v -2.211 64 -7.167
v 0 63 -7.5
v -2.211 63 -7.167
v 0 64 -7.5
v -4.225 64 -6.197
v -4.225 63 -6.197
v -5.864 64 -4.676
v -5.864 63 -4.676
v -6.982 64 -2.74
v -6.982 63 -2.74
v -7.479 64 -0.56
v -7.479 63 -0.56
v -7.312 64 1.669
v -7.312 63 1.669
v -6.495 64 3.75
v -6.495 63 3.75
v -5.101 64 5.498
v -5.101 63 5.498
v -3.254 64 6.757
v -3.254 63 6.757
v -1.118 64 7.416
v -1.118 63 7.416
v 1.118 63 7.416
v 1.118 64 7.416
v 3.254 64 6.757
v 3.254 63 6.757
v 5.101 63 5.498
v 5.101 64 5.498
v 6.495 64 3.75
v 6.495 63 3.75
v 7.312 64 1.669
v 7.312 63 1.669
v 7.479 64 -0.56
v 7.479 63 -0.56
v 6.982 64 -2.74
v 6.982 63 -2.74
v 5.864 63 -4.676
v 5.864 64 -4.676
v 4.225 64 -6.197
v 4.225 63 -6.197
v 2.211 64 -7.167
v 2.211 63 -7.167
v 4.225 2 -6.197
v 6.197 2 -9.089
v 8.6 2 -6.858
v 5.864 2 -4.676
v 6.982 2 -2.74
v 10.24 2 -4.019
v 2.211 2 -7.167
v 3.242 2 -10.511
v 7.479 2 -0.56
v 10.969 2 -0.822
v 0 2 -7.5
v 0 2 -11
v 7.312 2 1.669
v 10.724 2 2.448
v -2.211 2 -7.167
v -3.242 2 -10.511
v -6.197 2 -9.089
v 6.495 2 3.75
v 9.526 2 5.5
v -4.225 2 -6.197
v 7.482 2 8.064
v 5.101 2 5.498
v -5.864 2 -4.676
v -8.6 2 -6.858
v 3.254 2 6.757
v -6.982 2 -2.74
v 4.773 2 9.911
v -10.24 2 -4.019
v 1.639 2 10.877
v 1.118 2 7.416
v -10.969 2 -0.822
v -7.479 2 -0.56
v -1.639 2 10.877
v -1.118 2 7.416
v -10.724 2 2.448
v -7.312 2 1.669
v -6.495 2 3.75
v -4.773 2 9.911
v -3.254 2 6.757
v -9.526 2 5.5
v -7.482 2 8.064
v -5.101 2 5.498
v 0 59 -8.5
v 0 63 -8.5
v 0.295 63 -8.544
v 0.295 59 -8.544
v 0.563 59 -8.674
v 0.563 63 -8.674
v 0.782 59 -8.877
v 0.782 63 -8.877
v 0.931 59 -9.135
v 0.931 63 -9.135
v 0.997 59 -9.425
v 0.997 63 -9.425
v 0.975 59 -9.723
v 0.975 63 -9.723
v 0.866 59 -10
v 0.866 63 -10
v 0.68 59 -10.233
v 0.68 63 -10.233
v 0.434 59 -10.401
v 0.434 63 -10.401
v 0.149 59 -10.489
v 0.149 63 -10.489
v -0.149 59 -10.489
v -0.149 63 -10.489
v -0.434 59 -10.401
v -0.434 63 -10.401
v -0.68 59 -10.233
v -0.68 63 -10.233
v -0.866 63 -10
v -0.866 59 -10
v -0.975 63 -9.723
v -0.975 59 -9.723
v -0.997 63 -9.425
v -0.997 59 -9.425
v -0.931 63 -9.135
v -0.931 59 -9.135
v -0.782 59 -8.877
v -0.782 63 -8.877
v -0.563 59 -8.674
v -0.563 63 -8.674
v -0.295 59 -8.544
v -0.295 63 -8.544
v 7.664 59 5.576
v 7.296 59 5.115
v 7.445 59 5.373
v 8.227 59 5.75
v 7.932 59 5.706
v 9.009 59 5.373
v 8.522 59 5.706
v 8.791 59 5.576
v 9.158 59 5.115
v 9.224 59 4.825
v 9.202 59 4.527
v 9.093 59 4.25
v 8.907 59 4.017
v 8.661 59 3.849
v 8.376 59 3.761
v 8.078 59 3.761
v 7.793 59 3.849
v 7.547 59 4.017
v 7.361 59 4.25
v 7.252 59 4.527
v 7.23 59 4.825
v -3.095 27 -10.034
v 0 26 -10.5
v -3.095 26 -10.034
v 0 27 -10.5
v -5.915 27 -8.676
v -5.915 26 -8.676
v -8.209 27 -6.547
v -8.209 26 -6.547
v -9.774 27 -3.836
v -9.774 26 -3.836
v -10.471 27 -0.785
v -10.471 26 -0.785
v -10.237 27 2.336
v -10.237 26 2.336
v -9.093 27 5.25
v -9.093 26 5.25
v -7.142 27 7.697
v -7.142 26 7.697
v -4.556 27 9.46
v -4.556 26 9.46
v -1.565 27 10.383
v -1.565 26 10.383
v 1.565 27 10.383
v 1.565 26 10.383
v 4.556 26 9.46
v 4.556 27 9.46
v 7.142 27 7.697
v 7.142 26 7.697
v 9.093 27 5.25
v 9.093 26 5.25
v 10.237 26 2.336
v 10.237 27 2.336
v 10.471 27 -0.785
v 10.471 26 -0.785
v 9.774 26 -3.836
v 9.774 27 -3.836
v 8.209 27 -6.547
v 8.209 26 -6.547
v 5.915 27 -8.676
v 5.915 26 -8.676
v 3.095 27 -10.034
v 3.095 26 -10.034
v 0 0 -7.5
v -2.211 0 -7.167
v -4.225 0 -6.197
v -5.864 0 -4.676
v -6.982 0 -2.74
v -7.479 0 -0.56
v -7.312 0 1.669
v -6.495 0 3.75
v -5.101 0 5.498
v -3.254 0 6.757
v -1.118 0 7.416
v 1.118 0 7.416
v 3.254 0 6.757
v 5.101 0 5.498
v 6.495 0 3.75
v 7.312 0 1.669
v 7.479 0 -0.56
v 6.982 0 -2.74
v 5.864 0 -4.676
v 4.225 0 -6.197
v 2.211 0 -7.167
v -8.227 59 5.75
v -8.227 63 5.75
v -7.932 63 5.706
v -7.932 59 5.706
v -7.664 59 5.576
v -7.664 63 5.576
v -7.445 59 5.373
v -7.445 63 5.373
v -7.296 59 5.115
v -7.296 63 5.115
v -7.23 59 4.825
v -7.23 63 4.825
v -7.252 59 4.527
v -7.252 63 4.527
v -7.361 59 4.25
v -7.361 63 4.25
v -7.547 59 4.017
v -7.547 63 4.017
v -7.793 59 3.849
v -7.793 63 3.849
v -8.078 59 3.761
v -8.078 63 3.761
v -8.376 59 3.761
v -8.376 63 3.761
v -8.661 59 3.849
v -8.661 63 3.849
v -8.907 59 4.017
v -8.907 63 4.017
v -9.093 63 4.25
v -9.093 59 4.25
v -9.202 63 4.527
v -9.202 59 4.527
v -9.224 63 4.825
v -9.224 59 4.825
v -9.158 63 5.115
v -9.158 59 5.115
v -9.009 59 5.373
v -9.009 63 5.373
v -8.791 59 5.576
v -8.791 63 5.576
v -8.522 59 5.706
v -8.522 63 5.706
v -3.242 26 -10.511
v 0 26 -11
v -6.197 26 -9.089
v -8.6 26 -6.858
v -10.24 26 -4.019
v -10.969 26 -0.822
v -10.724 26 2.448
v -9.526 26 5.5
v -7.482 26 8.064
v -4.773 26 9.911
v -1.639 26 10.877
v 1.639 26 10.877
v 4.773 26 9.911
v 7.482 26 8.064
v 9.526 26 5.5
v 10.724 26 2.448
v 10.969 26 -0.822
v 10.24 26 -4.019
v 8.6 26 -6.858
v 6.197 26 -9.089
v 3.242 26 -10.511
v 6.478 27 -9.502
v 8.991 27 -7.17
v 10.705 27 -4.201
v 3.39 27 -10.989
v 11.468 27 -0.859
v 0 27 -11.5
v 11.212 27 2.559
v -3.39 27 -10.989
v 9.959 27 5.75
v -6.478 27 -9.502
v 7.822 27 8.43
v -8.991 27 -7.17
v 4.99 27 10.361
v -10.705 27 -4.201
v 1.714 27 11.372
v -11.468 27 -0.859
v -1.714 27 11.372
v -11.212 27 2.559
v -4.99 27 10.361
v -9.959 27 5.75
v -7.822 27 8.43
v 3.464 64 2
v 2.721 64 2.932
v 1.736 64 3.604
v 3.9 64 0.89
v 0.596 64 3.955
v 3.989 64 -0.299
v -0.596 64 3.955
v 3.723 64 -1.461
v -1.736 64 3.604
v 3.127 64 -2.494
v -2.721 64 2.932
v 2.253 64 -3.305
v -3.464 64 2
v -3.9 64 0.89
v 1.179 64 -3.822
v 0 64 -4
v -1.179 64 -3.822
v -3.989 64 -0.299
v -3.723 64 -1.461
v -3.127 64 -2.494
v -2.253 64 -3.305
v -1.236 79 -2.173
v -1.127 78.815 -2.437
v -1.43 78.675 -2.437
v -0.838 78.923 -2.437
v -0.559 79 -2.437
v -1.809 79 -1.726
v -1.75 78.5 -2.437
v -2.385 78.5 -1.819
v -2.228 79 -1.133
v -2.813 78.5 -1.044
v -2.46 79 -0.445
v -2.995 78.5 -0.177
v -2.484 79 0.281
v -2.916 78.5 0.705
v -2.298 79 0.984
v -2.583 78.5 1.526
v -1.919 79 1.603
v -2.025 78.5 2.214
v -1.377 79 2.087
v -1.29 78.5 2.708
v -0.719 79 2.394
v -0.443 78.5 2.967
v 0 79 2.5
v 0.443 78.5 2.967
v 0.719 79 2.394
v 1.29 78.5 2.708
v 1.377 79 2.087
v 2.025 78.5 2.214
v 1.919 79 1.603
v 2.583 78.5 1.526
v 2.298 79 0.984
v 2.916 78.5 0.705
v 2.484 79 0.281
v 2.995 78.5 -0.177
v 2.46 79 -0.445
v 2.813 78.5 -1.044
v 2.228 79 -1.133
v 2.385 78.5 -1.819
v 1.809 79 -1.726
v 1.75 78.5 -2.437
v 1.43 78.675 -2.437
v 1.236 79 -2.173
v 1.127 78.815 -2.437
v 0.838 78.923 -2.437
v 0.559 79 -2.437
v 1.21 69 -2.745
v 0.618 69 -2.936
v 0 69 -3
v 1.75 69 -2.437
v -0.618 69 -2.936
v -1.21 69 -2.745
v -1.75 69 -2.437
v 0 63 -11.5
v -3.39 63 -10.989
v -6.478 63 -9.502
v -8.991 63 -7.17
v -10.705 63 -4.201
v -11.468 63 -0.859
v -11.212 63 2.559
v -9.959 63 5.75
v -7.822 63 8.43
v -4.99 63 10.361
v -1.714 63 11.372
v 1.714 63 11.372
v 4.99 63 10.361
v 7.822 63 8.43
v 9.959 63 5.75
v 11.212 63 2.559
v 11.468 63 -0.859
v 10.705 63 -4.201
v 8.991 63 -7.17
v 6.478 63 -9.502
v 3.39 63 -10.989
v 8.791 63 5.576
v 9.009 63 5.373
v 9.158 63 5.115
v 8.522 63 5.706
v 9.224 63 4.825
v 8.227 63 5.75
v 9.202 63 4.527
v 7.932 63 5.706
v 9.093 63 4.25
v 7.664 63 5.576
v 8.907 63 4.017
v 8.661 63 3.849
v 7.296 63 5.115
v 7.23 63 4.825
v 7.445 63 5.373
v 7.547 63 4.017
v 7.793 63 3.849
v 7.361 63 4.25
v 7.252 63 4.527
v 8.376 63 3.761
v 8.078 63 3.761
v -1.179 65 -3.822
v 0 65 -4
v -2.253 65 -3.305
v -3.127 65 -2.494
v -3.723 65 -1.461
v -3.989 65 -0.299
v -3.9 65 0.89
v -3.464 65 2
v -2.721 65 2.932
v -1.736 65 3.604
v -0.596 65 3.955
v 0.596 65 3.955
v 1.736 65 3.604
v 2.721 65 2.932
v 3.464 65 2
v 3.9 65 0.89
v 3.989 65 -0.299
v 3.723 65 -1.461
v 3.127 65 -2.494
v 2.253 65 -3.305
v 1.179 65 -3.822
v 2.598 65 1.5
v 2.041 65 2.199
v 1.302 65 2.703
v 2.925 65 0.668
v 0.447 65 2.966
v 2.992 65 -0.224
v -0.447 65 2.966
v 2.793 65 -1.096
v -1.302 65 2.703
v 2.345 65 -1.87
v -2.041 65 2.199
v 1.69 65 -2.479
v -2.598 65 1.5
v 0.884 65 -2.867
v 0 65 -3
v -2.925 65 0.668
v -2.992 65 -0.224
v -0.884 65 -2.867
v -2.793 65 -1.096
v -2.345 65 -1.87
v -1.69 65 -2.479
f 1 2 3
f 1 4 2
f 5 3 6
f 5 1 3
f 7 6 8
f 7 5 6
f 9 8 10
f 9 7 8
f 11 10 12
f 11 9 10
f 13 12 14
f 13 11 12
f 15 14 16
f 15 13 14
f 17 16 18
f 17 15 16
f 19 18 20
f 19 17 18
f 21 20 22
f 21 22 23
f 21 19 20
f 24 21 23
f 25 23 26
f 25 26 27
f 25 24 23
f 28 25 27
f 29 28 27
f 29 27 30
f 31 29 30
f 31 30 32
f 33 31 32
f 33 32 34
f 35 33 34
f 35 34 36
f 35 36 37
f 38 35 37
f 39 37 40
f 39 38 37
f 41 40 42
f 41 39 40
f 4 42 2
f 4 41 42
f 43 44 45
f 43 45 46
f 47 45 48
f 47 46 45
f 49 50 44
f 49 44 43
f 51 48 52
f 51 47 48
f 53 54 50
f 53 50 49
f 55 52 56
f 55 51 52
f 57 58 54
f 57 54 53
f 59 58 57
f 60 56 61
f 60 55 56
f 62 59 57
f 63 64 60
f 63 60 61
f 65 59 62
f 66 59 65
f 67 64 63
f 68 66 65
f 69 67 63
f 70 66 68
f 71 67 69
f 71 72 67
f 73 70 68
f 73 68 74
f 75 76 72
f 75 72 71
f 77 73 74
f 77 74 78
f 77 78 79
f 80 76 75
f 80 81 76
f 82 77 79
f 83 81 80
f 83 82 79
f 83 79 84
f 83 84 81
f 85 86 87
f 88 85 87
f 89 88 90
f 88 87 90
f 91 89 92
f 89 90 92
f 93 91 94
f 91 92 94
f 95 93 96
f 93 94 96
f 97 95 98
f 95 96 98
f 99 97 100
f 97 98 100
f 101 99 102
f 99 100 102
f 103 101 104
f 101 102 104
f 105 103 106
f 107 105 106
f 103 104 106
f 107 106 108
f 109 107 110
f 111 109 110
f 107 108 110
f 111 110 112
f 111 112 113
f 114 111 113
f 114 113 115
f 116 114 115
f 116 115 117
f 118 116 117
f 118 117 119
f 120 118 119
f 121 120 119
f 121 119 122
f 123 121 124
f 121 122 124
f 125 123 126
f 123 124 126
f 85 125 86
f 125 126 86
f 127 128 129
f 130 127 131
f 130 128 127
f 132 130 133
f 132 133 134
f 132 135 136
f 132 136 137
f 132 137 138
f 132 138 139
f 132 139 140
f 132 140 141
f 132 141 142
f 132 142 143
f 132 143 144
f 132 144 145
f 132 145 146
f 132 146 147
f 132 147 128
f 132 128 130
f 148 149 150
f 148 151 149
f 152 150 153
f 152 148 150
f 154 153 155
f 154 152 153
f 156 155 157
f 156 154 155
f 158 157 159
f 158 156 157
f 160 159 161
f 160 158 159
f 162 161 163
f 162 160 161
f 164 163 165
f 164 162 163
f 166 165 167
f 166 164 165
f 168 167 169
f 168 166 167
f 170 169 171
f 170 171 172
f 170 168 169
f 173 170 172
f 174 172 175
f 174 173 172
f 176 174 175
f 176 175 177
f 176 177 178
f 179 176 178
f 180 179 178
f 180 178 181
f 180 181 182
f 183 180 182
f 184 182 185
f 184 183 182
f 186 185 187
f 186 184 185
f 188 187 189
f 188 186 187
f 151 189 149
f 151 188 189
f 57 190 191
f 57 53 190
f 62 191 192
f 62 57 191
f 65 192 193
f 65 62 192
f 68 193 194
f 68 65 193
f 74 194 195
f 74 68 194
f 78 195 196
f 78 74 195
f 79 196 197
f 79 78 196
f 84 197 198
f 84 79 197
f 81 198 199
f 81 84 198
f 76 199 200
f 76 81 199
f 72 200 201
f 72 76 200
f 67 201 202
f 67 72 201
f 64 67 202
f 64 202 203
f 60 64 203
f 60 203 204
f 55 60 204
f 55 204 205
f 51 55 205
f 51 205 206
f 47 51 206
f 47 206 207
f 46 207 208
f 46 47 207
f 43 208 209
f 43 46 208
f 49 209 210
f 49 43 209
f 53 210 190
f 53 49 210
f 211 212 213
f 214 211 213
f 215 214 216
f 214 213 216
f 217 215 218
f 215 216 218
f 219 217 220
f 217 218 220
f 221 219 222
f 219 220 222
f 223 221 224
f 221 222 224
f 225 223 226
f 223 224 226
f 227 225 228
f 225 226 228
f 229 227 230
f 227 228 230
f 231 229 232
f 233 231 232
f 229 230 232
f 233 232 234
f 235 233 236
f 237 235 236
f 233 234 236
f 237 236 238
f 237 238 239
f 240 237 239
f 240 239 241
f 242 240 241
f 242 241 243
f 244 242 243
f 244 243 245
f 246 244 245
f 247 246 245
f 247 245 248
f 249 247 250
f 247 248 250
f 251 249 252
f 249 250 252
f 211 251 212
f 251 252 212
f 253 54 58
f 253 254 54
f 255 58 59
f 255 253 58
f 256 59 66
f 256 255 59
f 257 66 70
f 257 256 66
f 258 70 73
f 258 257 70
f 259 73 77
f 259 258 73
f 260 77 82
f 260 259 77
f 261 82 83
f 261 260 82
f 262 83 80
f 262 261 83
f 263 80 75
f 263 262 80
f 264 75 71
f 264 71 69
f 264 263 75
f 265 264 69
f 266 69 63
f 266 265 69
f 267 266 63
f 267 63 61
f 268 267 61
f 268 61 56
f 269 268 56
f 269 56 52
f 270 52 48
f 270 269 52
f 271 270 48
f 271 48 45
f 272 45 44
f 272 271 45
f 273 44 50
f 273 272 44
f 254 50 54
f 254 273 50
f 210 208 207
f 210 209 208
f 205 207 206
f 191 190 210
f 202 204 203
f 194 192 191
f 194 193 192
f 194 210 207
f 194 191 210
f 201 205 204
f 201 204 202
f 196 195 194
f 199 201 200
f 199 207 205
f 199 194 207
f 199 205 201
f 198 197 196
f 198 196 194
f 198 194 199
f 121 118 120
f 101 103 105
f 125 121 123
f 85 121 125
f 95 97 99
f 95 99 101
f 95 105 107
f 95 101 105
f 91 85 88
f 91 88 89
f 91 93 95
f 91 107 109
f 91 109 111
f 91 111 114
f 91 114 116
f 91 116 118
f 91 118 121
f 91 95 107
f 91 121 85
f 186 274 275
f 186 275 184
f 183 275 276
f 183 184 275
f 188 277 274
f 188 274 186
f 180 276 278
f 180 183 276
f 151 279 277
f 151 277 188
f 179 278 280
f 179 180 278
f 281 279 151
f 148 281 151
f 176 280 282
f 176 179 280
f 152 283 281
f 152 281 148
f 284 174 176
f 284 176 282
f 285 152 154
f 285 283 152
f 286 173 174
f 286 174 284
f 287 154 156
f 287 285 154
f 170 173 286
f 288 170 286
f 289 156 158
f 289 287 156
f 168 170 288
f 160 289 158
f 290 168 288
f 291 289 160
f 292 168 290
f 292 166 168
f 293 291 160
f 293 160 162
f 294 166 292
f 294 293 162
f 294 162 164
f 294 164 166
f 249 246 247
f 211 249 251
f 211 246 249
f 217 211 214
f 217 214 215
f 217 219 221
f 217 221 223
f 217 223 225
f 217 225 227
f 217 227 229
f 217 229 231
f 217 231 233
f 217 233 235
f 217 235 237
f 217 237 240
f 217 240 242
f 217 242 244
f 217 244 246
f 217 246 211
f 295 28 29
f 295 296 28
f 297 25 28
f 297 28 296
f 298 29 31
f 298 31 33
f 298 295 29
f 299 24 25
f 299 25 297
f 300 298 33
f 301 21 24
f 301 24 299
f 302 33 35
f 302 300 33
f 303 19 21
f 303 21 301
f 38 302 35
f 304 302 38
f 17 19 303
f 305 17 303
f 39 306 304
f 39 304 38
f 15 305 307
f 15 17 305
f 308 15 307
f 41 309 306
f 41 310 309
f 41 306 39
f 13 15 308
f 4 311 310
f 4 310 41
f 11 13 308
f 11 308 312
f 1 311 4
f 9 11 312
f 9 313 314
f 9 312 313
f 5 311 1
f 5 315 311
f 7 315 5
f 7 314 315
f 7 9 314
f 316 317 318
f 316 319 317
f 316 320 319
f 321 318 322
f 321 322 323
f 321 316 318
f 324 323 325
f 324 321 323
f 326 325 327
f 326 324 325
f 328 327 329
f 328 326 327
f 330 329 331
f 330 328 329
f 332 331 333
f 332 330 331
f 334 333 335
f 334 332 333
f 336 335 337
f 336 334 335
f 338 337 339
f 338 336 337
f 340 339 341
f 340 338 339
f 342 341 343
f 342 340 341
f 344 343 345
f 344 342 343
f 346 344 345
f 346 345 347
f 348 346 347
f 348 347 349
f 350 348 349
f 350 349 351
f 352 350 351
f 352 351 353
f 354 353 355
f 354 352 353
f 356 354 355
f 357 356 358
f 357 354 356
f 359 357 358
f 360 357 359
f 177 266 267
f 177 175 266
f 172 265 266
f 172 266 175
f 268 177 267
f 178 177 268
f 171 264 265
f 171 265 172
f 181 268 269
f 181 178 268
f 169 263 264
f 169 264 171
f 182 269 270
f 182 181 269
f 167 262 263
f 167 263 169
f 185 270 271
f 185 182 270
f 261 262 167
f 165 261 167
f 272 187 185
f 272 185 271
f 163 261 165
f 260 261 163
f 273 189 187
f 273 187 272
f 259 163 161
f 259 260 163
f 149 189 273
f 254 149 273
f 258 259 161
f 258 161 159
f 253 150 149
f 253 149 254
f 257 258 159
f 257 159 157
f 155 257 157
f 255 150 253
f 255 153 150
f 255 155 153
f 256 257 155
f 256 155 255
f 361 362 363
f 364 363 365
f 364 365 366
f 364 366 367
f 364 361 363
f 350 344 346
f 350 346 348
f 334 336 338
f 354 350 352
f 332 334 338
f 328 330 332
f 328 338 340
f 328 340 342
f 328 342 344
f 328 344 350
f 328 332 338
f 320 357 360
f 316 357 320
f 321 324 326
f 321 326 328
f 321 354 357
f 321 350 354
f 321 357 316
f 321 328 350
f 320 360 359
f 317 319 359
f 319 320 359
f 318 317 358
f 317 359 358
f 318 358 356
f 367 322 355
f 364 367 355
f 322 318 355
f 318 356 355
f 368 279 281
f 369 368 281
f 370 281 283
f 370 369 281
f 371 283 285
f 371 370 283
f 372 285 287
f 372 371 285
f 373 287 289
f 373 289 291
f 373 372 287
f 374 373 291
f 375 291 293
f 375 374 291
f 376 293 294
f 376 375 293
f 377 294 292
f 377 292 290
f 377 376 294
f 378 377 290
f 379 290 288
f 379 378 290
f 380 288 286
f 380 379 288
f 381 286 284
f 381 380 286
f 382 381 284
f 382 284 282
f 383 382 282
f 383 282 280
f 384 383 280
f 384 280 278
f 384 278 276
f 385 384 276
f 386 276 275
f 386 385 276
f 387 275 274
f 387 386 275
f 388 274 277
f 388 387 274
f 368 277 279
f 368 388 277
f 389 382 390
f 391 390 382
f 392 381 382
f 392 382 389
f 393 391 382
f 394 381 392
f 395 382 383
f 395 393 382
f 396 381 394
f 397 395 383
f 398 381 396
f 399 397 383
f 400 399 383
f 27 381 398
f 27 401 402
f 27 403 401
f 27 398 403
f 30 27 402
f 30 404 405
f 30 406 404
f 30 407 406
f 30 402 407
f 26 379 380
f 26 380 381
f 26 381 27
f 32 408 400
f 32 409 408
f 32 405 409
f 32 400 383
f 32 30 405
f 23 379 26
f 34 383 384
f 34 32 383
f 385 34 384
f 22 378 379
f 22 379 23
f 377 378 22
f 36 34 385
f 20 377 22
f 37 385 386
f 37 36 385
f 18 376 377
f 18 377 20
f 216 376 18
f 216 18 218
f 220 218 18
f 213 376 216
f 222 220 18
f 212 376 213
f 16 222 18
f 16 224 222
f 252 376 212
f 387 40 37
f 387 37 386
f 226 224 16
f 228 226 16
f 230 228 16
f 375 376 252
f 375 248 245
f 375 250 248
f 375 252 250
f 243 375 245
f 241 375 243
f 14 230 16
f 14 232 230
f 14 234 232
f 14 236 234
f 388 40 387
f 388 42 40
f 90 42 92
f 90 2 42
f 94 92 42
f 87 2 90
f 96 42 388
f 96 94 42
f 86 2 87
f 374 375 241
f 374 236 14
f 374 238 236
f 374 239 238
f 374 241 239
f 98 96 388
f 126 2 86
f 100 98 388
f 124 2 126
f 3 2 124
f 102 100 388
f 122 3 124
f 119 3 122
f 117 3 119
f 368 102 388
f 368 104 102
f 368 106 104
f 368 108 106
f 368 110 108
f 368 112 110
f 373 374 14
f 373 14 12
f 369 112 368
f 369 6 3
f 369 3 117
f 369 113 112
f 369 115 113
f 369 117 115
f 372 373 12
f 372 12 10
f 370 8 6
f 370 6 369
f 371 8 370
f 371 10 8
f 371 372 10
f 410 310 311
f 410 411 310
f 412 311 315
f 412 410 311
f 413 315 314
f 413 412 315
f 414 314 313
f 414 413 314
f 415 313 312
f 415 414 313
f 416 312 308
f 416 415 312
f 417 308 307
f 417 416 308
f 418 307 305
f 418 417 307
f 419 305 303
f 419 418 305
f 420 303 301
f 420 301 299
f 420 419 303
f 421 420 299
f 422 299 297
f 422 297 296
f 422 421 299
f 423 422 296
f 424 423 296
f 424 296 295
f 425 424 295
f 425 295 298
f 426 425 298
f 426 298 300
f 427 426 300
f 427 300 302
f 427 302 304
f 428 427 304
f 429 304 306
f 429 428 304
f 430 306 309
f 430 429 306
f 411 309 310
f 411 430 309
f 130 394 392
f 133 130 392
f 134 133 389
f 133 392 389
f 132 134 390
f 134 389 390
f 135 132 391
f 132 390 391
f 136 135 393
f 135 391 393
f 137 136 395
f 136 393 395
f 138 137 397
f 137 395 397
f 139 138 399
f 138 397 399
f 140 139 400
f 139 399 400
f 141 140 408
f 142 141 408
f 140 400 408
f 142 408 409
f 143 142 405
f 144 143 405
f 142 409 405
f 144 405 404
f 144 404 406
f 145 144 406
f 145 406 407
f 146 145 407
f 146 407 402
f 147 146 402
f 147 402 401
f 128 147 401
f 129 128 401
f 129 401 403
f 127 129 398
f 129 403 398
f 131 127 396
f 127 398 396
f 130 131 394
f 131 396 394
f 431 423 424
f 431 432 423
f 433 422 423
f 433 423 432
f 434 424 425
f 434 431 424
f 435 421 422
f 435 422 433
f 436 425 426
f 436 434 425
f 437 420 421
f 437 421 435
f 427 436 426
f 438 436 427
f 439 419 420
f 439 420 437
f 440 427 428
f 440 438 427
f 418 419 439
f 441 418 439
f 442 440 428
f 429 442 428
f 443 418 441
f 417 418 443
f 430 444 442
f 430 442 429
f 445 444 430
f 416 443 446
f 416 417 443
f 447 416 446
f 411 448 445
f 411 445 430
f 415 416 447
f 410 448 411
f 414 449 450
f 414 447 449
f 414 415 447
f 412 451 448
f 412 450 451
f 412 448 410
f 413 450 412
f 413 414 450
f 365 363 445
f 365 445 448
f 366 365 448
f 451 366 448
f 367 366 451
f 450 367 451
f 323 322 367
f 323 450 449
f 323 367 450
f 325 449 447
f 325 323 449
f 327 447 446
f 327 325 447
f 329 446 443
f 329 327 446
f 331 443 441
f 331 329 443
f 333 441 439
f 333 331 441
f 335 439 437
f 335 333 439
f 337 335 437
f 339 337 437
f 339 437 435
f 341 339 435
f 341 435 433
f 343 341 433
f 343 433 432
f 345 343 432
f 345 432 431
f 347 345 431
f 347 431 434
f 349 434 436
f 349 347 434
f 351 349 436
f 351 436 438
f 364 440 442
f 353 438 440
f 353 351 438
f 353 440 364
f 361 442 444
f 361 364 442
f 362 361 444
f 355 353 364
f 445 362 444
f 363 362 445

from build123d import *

# Parameters (mm, degrees)
ENL_V_MAT_EXTRU_2_DEPTH = 10
CHANFREIN1_SIZE         = 0.5
ESQUISSE3_R             = 1
ENL_V_MAT_EXTRU_3_DEPTH = 4


with BuildPart() as part:
    # Esquisse1 → Révolution1 (revolve)
    with BuildSketch(Plane.XY, mode=Mode.PRIVATE) as r_volution1_sk:
        Polygon((0, 0), (7.5, 0), (7.5, 2), (11, 2), (11, 26), (10.5, 26), (10.5, 27), (11.5, 27), (11.5, 63), (7.5, 63), (7.5, 64), (4, 64), (4, 65), (3, 65), (3, 79), (0, 79), align=None)
    revolve(r_volution1_sk.sketch.rotate(Axis((0, 0, 0), (0, 1, 0)), 90), axis=Axis((0, 0, 0), (0, 1, 0)))

    # Esquisse2 → Enlèv. mat.-Extru.2 (cut)
    with BuildSketch(Plane(origin=(0, 79, 0), x_dir=(1, 0, 0), z_dir=(0, 1, 0))):
        with BuildLine():
            Line((-1.75, 2.436698586), (1.75, 2.436698586))
            ThreePointArc((1.75, 2.436698586), (0, 3), (-1.75, 2.436698586))
        make_face()
    extrude(amount=-ENL_V_MAT_EXTRU_2_DEPTH, mode=Mode.SUBTRACT)

    # Chanfrein1
    chanfrein1_edges = [part.edges().sort_by_distance(p)[0] for p in [
        (0, 79, 3),
    ]]
    chamfer(chanfrein1_edges, length=CHANFREIN1_SIZE)

    # Esquisse3 → Enlèv. mat.-Extru.3 (cut)
    with BuildSketch(Plane(origin=(0, 63, 0), x_dir=(1, 0, 0), z_dir=(0, 1, 0))):
        with Locations(Location((0, 9.5, 0), (0, 0, 270))):
            Circle(ESQUISSE3_R)
        with Locations(Location((8.227241336, -4.75, 0), (0, 0, 270))):
            Circle(ESQUISSE3_R)
        with Locations(Location((-8.227241336, -4.75, 0), (0, 0, 270))):
            Circle(ESQUISSE3_R)
    extrude(amount=-ENL_V_MAT_EXTRU_3_DEPTH, mode=Mode.SUBTRACT)


solid = part.part
